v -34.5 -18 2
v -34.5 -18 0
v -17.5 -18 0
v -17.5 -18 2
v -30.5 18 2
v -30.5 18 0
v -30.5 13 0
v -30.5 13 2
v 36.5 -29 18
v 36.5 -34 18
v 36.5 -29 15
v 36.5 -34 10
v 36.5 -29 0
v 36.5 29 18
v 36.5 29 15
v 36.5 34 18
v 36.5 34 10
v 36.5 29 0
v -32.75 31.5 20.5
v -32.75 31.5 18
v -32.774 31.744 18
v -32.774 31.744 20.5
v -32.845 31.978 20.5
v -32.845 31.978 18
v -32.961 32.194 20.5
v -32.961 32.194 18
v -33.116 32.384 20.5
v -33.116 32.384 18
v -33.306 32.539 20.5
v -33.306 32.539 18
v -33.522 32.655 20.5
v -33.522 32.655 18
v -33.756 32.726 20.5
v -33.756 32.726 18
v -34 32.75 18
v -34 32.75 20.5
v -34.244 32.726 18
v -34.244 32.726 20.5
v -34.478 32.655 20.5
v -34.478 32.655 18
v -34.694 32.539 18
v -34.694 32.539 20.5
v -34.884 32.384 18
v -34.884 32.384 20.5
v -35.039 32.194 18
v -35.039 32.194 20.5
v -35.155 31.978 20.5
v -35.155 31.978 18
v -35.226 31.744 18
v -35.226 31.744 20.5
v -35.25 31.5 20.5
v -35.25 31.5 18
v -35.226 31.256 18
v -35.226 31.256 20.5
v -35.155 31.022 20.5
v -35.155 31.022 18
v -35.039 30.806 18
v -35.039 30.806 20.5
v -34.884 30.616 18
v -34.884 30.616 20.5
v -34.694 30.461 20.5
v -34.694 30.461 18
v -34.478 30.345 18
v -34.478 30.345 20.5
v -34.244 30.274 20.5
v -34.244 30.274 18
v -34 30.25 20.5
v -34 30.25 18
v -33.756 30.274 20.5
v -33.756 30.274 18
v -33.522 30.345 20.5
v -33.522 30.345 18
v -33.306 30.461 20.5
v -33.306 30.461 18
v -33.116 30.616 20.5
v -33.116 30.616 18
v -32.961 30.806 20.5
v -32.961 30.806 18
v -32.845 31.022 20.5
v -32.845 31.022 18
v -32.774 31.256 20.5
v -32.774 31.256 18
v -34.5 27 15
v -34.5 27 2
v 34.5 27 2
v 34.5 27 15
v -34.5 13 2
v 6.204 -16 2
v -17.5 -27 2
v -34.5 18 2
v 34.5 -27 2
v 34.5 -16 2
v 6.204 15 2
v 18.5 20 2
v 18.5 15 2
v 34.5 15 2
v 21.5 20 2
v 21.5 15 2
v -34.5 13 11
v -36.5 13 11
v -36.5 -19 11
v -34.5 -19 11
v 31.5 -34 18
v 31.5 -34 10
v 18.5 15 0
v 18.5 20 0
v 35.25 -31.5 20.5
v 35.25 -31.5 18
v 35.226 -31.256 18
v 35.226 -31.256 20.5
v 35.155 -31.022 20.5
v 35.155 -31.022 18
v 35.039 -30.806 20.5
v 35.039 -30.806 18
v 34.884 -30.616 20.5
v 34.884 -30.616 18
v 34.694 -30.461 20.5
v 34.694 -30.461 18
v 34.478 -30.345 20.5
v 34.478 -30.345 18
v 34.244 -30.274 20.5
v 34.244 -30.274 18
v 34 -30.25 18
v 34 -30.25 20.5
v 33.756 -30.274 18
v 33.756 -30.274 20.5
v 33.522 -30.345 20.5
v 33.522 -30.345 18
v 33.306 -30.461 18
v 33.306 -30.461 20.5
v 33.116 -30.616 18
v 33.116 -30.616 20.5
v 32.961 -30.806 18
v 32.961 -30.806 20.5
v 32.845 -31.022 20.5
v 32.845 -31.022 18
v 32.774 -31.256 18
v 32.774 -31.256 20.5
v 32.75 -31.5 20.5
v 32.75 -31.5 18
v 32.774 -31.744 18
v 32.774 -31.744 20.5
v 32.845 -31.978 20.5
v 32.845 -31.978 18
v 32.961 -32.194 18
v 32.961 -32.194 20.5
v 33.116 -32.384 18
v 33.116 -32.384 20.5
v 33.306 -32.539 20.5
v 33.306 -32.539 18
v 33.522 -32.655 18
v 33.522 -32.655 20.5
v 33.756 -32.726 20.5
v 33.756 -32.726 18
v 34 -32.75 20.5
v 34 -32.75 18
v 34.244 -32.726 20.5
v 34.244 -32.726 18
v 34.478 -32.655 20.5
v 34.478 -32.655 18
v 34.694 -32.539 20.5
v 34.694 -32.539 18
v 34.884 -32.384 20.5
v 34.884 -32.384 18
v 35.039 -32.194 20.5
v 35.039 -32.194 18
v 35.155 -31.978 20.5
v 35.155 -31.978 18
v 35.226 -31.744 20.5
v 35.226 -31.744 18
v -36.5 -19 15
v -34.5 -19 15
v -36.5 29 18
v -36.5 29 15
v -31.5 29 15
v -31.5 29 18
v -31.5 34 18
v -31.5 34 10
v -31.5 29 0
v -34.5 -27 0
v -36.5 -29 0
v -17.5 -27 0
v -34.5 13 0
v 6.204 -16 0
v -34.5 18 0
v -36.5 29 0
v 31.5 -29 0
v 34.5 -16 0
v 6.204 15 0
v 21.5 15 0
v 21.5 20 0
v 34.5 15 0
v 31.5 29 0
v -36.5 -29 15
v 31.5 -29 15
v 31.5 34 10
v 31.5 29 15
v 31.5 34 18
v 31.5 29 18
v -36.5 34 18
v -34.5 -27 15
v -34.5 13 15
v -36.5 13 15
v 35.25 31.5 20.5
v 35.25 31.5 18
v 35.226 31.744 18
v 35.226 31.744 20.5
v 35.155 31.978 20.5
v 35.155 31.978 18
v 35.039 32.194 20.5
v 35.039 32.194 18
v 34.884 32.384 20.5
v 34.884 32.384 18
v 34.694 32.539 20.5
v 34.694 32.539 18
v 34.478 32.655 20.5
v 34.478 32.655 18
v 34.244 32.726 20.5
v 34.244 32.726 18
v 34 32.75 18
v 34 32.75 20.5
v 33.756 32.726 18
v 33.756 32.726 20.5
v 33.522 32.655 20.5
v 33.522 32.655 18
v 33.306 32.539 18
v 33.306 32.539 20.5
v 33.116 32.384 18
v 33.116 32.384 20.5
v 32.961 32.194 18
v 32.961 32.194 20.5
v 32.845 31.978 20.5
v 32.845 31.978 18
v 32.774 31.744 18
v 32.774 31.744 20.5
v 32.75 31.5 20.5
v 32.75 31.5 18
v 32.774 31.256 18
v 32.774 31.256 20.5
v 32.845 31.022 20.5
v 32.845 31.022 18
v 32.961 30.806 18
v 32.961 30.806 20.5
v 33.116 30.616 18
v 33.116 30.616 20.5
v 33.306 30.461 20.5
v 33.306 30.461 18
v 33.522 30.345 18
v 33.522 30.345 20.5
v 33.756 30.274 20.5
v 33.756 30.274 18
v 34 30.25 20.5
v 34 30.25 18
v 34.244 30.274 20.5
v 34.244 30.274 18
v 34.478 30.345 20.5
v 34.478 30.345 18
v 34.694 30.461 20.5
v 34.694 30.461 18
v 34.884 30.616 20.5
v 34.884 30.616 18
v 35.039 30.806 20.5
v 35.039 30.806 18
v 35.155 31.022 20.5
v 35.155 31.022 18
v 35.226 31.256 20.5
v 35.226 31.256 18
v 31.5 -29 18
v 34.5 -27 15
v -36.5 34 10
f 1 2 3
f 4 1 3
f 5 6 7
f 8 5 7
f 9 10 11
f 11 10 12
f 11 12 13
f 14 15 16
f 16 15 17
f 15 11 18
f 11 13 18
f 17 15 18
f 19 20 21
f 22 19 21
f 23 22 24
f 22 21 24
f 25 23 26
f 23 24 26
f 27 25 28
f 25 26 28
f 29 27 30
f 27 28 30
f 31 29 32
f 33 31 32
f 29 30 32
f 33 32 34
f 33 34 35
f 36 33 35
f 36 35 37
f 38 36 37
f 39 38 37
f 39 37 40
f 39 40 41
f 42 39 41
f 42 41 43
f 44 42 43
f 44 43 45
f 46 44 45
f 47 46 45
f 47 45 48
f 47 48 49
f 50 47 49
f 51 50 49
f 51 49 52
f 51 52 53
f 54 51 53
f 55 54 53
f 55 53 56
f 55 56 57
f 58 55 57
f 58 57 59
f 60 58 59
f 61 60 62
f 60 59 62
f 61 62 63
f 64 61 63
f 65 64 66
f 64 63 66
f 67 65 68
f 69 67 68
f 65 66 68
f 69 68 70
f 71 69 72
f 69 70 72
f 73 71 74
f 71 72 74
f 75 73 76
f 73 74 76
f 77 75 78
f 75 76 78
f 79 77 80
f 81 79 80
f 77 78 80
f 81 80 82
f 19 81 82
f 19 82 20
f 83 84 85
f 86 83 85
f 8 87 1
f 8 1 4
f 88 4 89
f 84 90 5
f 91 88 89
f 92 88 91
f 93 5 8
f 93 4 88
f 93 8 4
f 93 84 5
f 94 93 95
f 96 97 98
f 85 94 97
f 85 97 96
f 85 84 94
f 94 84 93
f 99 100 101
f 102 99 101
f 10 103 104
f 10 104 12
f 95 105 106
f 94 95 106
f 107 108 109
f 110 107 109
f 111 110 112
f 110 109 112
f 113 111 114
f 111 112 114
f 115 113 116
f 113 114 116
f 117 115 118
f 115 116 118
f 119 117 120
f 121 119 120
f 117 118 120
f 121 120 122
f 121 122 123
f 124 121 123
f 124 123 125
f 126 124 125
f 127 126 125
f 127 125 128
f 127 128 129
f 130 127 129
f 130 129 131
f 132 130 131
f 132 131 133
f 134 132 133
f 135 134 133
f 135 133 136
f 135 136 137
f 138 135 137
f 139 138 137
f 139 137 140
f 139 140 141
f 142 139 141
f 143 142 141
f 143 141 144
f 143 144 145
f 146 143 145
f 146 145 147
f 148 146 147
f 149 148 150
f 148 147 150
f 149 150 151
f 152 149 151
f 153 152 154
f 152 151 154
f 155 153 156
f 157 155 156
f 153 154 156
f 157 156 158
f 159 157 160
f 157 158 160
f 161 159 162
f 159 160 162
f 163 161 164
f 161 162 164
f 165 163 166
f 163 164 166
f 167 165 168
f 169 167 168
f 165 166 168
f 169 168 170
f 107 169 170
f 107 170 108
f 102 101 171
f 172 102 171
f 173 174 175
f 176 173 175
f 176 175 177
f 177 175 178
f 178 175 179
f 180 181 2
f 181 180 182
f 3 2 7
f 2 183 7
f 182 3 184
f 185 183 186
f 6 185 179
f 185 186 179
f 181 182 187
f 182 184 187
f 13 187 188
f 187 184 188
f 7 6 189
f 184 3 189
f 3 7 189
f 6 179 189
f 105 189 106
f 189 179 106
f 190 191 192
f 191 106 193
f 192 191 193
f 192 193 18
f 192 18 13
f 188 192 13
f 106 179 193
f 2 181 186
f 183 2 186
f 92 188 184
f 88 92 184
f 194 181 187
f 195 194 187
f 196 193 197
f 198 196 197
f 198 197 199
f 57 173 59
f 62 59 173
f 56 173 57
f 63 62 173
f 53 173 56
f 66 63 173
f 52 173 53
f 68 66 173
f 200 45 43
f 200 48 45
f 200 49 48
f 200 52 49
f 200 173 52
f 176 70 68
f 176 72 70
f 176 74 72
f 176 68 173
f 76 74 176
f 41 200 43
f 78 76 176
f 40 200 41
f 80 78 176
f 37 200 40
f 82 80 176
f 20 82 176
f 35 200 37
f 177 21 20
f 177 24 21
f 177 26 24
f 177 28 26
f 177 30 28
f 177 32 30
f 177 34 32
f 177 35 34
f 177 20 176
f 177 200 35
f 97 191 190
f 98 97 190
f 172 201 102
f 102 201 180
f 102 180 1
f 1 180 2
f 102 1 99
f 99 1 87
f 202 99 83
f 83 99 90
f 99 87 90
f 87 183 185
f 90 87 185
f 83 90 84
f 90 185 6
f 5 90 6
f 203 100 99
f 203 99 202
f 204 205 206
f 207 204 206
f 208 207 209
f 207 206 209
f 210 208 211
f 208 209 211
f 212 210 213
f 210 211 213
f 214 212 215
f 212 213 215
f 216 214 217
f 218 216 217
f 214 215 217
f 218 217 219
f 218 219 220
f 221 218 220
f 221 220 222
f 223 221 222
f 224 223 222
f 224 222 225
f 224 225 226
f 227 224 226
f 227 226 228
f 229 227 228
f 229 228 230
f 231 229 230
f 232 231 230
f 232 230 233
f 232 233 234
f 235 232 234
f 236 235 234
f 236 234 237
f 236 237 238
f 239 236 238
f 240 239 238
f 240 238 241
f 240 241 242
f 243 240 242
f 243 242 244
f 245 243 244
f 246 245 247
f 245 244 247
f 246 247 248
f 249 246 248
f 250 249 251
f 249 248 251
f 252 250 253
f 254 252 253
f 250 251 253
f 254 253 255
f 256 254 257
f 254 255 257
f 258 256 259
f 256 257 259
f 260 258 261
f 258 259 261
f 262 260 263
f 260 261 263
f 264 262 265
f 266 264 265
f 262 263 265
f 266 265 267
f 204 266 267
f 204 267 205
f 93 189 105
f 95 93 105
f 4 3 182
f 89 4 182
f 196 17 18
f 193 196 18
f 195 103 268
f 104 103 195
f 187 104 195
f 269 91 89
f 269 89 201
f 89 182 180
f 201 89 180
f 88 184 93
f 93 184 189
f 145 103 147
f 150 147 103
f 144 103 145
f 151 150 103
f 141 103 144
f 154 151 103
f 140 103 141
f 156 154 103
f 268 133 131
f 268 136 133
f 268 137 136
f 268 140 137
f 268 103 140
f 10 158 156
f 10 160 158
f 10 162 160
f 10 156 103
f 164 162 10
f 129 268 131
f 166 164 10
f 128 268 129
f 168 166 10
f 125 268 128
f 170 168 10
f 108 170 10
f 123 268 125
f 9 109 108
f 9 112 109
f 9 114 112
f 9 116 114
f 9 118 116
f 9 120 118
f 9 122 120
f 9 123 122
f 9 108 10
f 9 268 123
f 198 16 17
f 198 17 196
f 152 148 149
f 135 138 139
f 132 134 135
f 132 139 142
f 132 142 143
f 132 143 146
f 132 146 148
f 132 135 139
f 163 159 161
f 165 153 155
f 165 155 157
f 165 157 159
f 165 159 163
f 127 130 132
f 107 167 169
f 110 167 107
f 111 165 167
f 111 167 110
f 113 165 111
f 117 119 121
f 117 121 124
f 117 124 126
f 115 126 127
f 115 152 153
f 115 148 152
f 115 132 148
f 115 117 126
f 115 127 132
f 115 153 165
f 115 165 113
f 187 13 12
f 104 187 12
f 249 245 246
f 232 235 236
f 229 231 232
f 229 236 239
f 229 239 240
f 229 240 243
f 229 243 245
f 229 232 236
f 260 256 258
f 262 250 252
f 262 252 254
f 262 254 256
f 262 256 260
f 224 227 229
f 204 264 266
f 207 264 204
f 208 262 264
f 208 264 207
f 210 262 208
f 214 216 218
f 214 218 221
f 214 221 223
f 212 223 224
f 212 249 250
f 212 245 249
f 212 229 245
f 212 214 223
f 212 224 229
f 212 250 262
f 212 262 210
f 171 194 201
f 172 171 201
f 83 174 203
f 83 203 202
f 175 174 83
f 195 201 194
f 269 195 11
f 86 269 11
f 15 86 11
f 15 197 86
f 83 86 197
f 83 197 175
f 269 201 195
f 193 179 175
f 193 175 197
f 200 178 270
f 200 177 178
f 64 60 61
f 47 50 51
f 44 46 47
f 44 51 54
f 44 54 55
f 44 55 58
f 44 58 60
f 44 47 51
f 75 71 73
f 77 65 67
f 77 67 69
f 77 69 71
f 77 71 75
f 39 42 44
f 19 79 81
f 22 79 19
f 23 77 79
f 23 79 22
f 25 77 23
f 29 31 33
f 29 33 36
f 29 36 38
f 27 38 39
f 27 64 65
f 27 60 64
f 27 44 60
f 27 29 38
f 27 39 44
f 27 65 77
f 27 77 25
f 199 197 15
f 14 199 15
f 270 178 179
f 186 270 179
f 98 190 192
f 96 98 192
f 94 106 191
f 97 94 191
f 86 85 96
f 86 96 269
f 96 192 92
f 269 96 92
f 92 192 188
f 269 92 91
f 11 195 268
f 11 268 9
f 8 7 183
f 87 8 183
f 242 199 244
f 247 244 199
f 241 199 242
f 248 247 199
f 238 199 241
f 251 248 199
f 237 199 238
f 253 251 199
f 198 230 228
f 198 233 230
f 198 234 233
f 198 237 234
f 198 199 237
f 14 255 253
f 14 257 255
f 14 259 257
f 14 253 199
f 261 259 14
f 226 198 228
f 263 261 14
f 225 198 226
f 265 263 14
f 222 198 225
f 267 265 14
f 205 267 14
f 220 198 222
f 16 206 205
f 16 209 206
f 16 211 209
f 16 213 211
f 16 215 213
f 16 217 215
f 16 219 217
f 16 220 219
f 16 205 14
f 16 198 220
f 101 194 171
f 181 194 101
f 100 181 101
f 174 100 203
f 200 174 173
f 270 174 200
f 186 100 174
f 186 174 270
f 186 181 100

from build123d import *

# Parameters (mm, degrees)
F0_W      = 73
F0_H      = 58
F1_DEPTH  = 15
F2_DEPTH  = 2
F3_W      = 5
F3_H      = 15
F4_DEPTH  = 5
F5_W      = 5
F5_H      = 15
F6_DEPTH  = 5
F7_R      = 1.25
F8_DEPTH  = 5.5
F9_DEPTH  = 5.5
F11_DEPTH = 73.001
F12_W     = 32
F12_H     = 4
F13_DEPTH = 2
F7_W      = 5
F7_H      = 5
F14_DEPTH = 3


with BuildPart() as f1:
    # F0 (on Top) → F1 (new body)
    with BuildSketch(Plane.XY):
        Rectangle(F0_W, F0_H)
        Polygon((-34.5, 18), (-34.5, 27), (34.5, 27), (34.5, 15), (34.5, -16), (34.5, -27), (-17.5, -27), (-34.5, -27), (-34.5, -18), (-34.5, 13), align=None, mode=Mode.SUBTRACT)
    extrude(amount=F1_DEPTH)

    # F0 (on Top) → F2 (join)
    with BuildSketch(Plane.XY):
        Polygon((34.5, 27), (-34.5, 27), (-34.5, 18), (-30.5, 18), (-30.5, 13), (-34.5, 13), (-34.5, -18), (-17.5, -18), (-17.5, -27), (34.5, -27), (34.5, -16), (6.203858, -16), (6.203858, 15), (18.5, 15), (18.5, 20), (21.5, 20), (21.5, 15), (34.5, 15), align=None)
    extrude(amount=F2_DEPTH)

    # F3 (on face) → F4 (join)
    with BuildSketch(Plane(origin=(0, 29, 0), x_dir=(-1, 0, 0), z_dir=(0, 1, 0))):
        with Locations((-34, 7.5)):
            Rectangle(F3_W, F3_H)
        with Locations((34, 7.5)):
            Rectangle(F3_W, F3_H)
    extrude(amount=F4_DEPTH)

    # F5 (on face) → F6 (join)
    with BuildSketch(Plane.XZ.offset(29)):
        with Locations((34, 7.5)):
            Rectangle(F5_W, F5_H)
    extrude(amount=F6_DEPTH)

    # F7 (on face) → F8 (join)
    with BuildSketch(Plane.XY.offset(15)):
        with Locations((34, -31.5)):
            Circle(F7_R)
        with Locations((-34, 31.5)):
            Circle(F7_R)
    extrude(amount=F8_DEPTH)

    # F7 (on face) → F9 (join)
    with BuildSketch(Plane.XY.offset(15)):
        with Locations((34, 31.5)):
            Circle(F7_R)
    extrude(amount=F9_DEPTH)

    # F10 (on face) → F11 (cut, through all)
    with BuildSketch(Plane.YZ.offset(36.5)):
        Polygon((-34, 0), (-29, 0), (-34, 10), align=None)
        Polygon((34, 0), (34, 10), (29, 0), align=None)
    extrude(amount=-F11_DEPTH, mode=Mode.SUBTRACT)

    # F12 (on face) → F13 (cut)
    with BuildSketch(Plane(origin=(-36.5, 0, 0), x_dir=(0, -1, 0), z_dir=(-1, 0, 0))):
        with Locations((3, 13)):
            Rectangle(F12_W, F12_H)
    extrude(amount=-F13_DEPTH, mode=Mode.SUBTRACT)

    # F7 (on face) → F14 (join)
    with BuildSketch(Plane.XY.offset(15)):
        with Locations((34, -31.5)):
            Rectangle(F7_W, F7_H)
        with Locations((34, -31.5)):
            Circle(F7_R, mode=Mode.SUBTRACT)
        with Locations((34, 31.5)):
            Rectangle(F7_W, F7_H)
        with Locations((34, 31.5)):
            Circle(F7_R, mode=Mode.SUBTRACT)
        with Locations((-34, 31.5)):
            Rectangle(F7_W, F7_H)
        with Locations((-34, 31.5)):
            Circle(F7_R, mode=Mode.SUBTRACT)
    extrude(amount=F14_DEPTH)


solid = f1.part
